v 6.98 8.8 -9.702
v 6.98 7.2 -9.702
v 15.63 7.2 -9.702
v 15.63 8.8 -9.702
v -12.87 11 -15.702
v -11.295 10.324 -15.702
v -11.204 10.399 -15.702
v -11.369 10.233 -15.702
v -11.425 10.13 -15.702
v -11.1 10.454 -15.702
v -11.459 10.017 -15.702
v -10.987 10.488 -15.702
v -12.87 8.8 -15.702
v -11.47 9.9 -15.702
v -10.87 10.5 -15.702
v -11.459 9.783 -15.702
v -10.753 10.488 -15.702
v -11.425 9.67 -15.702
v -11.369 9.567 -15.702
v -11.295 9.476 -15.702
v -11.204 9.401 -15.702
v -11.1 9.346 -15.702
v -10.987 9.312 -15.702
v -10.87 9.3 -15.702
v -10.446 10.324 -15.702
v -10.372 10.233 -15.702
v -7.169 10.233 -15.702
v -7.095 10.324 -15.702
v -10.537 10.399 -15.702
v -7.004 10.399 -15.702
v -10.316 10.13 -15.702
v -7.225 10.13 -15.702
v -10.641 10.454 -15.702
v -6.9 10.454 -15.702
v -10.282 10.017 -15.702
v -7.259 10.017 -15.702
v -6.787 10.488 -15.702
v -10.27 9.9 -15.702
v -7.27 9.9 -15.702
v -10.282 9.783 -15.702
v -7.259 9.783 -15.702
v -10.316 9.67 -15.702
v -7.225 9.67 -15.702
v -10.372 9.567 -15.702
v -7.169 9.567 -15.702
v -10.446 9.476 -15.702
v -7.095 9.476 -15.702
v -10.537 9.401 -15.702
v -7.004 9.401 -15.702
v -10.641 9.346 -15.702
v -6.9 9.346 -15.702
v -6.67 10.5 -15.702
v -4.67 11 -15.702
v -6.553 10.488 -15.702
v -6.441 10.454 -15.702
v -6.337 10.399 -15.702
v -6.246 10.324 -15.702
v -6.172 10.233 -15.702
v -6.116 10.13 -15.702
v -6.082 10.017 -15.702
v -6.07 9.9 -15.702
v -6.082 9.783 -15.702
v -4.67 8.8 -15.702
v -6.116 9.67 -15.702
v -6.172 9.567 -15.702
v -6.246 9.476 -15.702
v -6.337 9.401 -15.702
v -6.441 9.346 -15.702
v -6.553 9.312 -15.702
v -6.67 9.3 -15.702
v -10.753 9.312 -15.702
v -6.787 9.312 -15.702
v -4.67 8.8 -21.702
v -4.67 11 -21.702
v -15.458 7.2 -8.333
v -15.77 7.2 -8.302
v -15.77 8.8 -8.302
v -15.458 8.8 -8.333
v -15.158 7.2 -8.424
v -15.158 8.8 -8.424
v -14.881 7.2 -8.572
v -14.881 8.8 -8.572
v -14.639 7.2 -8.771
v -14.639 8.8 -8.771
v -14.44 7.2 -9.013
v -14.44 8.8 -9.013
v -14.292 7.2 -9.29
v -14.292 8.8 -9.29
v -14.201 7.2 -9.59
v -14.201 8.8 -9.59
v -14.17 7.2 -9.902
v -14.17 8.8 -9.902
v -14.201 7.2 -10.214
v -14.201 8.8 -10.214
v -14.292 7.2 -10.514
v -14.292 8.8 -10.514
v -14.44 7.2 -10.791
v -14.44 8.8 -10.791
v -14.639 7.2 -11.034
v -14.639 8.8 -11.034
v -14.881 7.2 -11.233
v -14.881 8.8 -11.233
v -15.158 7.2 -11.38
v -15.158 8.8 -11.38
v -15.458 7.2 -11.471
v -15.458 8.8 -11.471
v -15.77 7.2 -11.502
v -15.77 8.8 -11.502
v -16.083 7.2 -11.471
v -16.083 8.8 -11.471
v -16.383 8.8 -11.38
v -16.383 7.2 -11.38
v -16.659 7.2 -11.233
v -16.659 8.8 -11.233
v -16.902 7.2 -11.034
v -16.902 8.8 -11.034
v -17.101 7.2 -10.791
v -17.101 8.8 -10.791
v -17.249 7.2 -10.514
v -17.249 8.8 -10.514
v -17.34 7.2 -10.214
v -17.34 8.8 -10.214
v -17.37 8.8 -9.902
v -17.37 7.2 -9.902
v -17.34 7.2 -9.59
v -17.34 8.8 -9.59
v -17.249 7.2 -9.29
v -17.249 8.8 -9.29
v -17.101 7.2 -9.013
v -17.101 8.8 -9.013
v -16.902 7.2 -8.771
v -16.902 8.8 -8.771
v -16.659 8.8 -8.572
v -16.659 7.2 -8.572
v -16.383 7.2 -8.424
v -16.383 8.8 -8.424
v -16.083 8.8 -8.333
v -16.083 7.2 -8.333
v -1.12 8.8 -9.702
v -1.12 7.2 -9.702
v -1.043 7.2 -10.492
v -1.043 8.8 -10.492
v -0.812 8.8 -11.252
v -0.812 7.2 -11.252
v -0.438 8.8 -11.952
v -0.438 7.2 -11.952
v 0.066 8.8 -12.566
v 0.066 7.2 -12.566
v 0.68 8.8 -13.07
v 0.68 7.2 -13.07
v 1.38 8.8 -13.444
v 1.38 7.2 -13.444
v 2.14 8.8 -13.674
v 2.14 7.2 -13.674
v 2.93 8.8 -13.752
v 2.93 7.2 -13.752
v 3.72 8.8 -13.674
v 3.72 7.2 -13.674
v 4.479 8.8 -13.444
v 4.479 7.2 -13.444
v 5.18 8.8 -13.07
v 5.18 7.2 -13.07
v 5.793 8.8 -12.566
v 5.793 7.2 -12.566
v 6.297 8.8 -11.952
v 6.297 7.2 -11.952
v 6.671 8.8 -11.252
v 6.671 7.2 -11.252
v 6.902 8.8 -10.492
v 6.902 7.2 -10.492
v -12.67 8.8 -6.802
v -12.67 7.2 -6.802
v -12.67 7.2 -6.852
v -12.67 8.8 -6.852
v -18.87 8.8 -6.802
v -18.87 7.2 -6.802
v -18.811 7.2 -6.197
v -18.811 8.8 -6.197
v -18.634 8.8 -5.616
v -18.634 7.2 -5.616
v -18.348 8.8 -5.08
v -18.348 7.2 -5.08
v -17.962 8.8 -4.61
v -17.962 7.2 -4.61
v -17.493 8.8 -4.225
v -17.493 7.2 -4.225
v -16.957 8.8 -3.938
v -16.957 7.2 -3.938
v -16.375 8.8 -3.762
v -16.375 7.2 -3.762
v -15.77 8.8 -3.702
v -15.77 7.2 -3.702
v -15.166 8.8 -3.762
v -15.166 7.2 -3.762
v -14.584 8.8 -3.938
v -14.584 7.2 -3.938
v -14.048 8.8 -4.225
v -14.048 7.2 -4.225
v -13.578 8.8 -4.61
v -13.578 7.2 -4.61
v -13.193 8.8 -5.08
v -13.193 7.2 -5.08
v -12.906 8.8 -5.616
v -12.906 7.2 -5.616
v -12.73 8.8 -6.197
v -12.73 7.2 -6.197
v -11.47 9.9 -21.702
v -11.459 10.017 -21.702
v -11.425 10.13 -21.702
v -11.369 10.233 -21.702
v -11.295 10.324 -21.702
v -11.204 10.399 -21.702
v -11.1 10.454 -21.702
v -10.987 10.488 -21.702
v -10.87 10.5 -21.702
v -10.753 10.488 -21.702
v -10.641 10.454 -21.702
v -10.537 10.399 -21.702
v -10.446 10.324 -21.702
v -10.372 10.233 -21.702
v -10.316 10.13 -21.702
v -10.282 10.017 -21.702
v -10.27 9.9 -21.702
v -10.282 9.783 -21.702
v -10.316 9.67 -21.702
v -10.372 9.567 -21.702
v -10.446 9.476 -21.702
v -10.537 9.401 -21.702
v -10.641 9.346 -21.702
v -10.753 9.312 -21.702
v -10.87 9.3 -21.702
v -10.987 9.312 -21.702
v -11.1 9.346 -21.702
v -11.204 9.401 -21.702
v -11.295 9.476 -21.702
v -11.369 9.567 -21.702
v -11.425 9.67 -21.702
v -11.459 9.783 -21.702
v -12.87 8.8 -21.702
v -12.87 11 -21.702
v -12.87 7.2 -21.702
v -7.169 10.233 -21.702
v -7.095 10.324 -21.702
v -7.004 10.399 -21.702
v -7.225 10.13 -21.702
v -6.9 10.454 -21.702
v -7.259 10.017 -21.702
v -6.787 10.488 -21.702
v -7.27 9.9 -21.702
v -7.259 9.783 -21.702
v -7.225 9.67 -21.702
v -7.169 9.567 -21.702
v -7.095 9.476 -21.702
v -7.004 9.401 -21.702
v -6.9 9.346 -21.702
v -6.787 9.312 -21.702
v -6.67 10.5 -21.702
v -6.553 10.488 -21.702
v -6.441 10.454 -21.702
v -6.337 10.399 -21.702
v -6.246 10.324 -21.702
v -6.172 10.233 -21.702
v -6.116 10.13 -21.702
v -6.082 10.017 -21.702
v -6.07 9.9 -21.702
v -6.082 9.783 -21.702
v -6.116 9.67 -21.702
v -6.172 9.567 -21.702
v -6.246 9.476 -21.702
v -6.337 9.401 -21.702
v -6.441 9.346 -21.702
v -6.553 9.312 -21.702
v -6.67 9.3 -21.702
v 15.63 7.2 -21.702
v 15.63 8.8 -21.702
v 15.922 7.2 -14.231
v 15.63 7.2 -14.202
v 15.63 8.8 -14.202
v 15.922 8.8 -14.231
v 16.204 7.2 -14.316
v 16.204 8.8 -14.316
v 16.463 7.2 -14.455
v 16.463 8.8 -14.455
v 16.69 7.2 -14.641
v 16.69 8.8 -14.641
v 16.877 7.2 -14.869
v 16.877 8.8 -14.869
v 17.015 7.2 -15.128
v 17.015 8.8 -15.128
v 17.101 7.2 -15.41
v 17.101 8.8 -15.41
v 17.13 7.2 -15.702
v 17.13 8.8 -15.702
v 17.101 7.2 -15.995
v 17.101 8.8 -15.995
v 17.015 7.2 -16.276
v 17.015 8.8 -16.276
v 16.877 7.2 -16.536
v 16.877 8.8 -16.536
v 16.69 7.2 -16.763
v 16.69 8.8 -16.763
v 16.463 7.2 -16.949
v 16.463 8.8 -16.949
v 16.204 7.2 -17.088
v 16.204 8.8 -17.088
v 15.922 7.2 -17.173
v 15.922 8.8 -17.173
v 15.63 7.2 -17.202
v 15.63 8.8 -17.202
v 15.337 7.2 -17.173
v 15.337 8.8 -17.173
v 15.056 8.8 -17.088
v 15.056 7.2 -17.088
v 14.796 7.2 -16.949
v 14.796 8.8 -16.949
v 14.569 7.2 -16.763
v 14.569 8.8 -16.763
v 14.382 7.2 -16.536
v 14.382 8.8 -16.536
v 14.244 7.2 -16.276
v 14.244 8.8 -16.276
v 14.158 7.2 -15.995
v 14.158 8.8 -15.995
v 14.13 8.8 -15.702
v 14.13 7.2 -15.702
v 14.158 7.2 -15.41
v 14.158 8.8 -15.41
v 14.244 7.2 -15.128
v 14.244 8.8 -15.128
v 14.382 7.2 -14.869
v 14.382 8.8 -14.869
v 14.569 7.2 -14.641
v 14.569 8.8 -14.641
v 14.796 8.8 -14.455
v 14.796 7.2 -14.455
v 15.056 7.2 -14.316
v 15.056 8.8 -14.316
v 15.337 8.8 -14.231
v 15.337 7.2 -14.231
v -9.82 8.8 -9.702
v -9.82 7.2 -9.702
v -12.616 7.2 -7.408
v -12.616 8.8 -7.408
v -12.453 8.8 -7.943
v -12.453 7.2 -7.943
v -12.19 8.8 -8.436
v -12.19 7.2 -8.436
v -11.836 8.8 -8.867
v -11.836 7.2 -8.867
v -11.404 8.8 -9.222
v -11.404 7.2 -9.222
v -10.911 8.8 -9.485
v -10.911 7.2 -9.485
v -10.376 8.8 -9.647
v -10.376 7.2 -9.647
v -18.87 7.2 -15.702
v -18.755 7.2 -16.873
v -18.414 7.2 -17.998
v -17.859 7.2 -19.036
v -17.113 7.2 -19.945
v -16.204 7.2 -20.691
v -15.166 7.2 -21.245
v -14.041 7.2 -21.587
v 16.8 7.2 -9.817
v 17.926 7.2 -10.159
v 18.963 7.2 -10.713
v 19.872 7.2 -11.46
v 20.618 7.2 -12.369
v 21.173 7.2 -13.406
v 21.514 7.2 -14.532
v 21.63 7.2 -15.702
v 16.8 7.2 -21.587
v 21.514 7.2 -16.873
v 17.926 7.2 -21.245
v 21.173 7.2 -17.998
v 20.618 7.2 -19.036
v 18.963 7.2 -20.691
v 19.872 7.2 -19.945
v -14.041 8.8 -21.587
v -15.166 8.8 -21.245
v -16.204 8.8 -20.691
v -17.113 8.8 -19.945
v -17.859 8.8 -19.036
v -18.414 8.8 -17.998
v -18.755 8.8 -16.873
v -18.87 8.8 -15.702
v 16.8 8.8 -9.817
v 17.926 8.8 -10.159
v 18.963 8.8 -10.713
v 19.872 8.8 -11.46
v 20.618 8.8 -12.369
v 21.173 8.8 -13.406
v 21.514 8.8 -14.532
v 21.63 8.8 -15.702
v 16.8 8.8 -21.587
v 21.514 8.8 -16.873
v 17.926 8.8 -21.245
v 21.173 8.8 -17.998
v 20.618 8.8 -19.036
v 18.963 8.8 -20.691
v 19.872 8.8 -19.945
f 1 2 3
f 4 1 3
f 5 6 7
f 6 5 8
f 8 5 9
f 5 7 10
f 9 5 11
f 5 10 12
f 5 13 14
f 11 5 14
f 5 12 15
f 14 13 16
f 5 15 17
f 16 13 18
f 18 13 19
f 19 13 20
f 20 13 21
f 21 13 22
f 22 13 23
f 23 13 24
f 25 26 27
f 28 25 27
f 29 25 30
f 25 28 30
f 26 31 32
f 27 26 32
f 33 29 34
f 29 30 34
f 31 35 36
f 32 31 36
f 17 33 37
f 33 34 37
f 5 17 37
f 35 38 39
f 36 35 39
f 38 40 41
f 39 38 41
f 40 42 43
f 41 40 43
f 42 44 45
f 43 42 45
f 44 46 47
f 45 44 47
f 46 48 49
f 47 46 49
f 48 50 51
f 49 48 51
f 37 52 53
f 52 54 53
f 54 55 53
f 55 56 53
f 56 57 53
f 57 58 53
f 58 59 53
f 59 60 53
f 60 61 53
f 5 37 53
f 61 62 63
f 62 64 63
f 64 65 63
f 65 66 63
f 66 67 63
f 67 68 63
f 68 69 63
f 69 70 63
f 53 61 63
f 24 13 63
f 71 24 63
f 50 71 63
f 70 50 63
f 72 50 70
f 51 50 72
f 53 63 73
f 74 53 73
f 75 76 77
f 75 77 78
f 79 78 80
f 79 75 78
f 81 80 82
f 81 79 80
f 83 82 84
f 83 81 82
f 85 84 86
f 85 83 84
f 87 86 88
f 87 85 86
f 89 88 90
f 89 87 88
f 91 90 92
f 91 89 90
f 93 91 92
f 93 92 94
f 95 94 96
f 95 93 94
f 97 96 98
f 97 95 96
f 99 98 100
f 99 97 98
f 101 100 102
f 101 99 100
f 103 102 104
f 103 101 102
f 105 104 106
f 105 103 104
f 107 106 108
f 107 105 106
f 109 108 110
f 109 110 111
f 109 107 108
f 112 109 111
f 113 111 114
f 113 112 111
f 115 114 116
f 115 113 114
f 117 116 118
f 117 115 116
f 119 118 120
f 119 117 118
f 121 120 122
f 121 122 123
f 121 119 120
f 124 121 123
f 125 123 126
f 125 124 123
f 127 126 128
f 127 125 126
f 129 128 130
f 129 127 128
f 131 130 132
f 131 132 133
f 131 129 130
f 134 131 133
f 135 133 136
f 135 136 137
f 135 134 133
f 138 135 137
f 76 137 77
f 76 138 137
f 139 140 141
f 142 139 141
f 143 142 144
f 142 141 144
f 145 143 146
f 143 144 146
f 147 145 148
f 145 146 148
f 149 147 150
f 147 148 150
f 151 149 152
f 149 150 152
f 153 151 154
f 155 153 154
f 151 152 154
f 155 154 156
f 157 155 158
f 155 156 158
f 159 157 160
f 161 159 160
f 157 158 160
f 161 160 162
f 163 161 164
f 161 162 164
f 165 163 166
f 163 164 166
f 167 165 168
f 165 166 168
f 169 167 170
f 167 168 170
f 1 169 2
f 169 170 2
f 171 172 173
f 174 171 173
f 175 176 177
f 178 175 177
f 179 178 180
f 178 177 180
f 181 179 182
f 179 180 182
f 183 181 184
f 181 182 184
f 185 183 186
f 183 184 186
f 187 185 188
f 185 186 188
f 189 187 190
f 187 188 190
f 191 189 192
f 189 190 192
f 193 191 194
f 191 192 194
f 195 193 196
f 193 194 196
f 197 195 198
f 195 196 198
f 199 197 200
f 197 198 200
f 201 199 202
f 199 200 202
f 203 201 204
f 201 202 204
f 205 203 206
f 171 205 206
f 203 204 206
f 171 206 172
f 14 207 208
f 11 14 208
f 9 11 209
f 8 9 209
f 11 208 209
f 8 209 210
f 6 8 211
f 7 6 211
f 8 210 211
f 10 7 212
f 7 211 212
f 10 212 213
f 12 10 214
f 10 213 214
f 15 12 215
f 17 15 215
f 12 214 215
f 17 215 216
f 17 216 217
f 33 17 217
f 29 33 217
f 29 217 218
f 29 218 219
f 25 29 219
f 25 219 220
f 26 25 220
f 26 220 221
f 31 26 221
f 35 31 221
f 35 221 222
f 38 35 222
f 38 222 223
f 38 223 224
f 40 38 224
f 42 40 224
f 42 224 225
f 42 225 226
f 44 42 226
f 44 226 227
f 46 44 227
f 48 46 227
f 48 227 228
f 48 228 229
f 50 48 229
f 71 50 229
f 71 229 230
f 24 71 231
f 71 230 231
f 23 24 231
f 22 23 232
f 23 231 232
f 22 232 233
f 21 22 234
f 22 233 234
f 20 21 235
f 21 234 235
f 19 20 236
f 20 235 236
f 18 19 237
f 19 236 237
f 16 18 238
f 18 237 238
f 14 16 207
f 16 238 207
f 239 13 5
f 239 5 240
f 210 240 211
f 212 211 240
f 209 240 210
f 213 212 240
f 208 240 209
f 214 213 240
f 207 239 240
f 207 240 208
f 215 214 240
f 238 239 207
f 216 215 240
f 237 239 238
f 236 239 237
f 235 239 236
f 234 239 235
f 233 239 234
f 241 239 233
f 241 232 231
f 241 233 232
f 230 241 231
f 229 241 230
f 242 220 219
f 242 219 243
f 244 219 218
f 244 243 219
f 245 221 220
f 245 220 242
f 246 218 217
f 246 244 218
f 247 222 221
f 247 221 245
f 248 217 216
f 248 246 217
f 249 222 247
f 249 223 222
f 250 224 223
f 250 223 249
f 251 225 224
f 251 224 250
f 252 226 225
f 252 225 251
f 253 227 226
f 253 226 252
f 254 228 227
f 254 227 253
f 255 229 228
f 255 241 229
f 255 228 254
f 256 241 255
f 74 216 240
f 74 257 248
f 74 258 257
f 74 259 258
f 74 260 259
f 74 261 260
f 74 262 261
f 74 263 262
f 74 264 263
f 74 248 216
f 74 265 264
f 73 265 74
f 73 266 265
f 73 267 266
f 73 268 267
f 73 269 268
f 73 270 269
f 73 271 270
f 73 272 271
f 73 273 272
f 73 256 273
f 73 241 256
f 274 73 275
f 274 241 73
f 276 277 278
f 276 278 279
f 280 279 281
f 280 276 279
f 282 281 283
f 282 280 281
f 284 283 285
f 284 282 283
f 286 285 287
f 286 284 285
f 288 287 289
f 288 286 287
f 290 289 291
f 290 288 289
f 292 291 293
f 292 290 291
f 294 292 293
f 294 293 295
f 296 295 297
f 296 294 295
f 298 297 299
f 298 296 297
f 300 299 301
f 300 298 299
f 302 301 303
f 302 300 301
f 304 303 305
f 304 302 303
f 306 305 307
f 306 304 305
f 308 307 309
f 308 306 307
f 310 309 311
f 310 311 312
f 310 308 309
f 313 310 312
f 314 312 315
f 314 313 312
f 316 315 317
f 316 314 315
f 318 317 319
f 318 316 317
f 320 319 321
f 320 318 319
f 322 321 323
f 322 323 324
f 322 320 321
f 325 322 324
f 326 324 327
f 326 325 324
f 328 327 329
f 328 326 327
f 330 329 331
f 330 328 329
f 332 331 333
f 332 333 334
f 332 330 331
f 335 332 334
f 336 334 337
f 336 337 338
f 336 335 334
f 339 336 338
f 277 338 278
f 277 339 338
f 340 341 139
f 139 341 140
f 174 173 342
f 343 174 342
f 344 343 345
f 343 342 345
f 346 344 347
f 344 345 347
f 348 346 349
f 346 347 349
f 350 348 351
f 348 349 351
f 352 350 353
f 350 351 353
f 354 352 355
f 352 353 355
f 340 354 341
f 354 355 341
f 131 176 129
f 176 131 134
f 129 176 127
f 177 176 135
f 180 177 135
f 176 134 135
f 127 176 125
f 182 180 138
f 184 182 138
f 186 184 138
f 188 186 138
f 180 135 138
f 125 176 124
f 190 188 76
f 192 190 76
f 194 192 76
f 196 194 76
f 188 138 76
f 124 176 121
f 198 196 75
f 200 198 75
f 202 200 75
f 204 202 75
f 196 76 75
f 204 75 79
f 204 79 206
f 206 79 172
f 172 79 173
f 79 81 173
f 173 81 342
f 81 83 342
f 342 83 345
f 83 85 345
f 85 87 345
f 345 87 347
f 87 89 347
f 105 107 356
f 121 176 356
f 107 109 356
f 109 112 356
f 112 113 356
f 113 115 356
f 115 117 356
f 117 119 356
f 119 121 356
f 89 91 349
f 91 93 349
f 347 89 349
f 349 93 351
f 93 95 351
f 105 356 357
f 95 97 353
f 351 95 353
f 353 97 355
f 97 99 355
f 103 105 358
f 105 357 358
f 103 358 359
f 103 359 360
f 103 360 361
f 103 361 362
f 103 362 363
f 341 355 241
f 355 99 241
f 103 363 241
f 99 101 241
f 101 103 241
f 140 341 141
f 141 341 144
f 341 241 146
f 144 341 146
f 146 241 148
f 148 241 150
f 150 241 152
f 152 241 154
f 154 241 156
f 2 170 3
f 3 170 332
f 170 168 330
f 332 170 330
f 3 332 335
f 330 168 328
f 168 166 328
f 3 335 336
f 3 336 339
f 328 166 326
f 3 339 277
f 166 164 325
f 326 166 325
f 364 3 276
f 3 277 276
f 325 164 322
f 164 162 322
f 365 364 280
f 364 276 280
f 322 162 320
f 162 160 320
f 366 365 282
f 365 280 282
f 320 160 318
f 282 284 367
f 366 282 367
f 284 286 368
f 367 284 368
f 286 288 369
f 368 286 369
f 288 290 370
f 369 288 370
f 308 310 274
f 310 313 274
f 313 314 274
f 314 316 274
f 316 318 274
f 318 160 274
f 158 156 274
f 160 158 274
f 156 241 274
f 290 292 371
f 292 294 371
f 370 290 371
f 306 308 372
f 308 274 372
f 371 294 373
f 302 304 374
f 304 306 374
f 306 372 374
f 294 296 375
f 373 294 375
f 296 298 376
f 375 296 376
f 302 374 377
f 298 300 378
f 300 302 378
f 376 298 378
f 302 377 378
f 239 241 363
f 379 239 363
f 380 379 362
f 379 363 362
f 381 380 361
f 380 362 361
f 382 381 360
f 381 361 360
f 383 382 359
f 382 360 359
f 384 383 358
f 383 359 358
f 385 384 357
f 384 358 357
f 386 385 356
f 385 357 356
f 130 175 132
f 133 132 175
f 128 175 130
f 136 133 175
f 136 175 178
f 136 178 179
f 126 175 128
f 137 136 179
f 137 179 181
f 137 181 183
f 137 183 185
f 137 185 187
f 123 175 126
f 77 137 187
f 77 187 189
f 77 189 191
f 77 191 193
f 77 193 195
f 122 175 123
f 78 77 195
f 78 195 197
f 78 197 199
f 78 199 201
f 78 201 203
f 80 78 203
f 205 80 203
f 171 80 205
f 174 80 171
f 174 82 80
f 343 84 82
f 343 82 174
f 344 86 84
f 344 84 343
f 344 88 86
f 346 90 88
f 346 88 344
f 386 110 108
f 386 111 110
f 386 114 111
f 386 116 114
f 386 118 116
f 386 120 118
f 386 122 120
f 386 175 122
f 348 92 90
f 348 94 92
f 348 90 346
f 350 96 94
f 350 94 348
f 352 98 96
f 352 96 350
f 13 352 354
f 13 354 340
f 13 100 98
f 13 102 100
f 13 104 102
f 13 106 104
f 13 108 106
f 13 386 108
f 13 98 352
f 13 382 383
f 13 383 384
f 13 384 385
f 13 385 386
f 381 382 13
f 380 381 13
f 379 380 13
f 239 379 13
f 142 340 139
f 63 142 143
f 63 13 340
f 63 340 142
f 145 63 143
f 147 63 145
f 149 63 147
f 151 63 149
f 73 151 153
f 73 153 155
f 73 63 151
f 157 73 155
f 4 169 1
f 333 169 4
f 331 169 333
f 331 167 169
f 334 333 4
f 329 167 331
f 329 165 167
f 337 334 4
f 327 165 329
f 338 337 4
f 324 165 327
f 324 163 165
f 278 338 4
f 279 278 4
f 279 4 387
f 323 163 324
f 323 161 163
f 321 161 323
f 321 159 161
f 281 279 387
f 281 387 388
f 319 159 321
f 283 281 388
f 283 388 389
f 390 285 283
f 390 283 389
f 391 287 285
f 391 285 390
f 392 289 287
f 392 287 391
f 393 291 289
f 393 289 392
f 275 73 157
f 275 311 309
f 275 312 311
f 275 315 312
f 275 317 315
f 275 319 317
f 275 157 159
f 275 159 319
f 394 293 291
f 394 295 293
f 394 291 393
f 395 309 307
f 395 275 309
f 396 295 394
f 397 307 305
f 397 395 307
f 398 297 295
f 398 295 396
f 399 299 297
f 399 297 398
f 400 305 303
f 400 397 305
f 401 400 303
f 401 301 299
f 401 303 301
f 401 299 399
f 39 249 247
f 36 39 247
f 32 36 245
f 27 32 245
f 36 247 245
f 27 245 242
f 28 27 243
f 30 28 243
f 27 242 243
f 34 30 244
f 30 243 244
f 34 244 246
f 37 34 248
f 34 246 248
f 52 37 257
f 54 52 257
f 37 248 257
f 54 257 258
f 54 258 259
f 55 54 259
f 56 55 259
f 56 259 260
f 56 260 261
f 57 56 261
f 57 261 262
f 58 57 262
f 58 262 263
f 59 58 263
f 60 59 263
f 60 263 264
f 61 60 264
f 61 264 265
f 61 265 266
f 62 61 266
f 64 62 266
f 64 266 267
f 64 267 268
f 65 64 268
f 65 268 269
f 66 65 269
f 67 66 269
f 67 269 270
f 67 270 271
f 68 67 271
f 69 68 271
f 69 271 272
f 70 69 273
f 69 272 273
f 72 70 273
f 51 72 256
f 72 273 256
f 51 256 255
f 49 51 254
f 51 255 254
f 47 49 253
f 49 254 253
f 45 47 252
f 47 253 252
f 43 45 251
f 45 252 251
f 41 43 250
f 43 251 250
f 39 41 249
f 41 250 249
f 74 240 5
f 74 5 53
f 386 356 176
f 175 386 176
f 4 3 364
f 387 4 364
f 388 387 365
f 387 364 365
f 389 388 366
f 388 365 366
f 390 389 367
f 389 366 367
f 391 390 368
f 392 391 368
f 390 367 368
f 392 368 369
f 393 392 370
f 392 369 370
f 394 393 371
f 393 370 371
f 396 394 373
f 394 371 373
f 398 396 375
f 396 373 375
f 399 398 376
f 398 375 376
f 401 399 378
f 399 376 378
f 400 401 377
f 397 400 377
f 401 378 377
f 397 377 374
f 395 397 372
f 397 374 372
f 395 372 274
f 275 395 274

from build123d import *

# Parameters (mm, degrees)
SKETCH1_R           = 15
SKETCH1_R_2         = 16
BOSS_EXTRUDE2_DEPTH = 16
SCALE1_SCALE        = 0.1
SKETCH2_W           = 8.2
SKETCH2_H           = 6
BOSS_EXTRUDE3_DEPTH = 2.2
CUT_EXTRUDE1_REACH  = 32.213
SKETCH3_R           = 0.6


with BuildPart() as part:
    # Sketch1 → Boss-Extrude2 (new body)
    with BuildSketch(Plane(origin=(0, 0, 0), x_dir=(1, 0, 0), z_dir=(0, 1, 0))):
        with BuildLine():
            Line((71.949541284, -40.775229358), (158.449541284, -40.775229358))
            ThreePointArc((158.449541284, -40.775229358), (218.449541284, 19.224770642), (158.449541284, 79.224770642))
            Line((158.449541284, 79.224770642), (-126.550458716, 79.224770642))
            ThreePointArc((-126.550458716, 79.224770642), (-168.976865587, 61.651177513), (-186.550458716, 19.224770642))
            Line((-186.550458716, 19.224770642), (-186.550458716, -40.775229358))
            Line((-186.550458716, -40.775229358), (-186.550458716, -69.775229358))
            ThreePointArc((-186.550458716, -69.775229358), (-155.550458716, -100.775229358), (-124.550458716, -69.775229358))
            Line((-124.550458716, -69.775229358), (-124.550458716, -69.275229358))
            ThreePointArc((-124.550458716, -69.275229358), (-116.203001979, -49.122686094), (-96.050458716, -40.775229358))
            Line((-96.050458716, -40.775229358), (-9.050458716, -40.775229358))
            ThreePointArc((-9.050458716, -40.775229358), (31.449541284, -0.275229358), (71.949541284, -40.775229358))
        make_face()
        with Locations(Location((158.449541284, 19.224770642, 0), (0, 0, 270))):
            Circle(SKETCH1_R, mode=Mode.SUBTRACT)
        with Locations(Location((-155.550458716, -38.775229358, 0), (0, 0, 270))):
            Circle(SKETCH1_R_2, mode=Mode.SUBTRACT)
    extrude(amount=BOSS_EXTRUDE2_DEPTH)


with BuildPart() as part_1:
    # Scale1: scaled about (-0.239262204, 8, -15.310747356)
    add(part.part.scale(SCALE1_SCALE).moved(Location((-0.215335984, 7.2, -13.77967262))))

    # Sketch2 → Boss-Extrude3 (add)
    with BuildSketch(Plane(origin=(0, 8.8, 0), x_dir=(1, 0, 0), z_dir=(0, 1, 0))):
        with Locations((-8.770381855, 18.702149685)):
            Rectangle(SKETCH2_W, SKETCH2_H)
    extrude(amount=BOSS_EXTRUDE3_DEPTH)

    # Sketch3 → Cut-Extrude1 (cut, up to next)
    with BuildSketch(Plane(origin=(0, 0, -21.702149685), x_dir=(-1, 0, 0), z_dir=(0, 0, -1)), mode=Mode.PRIVATE) as cut_extrude1_sk1:
        with Locations((6.670381855, 9.9)):
            Circle(SKETCH3_R)
    cut_extrude1_tool1 = extrude(cut_extrude1_sk1.sketch, amount=-CUT_EXTRUDE1_REACH, mode=Mode.PRIVATE) & part_1.part
    # Sketch3 → Cut-Extrude1 (cut, up to next)
    with BuildSketch(Plane(origin=(0, 0, -21.702149685), x_dir=(-1, 0, 0), z_dir=(0, 0, -1)), mode=Mode.PRIVATE) as cut_extrude1_sk2:
        with Locations((10.870381855, 9.9)):
            Circle(SKETCH3_R)
    cut_extrude1_tool2 = extrude(cut_extrude1_sk2.sketch, amount=-CUT_EXTRUDE1_REACH, mode=Mode.PRIVATE) & part_1.part
    add(cut_extrude1_tool1.solids().sort_by_distance((-6.670382, 9.9, -21.70215))[0], mode=Mode.SUBTRACT)
    add(cut_extrude1_tool2.solids().sort_by_distance((-10.870382, 9.9, -21.70215))[0], mode=Mode.SUBTRACT)


solid = part_1.part
